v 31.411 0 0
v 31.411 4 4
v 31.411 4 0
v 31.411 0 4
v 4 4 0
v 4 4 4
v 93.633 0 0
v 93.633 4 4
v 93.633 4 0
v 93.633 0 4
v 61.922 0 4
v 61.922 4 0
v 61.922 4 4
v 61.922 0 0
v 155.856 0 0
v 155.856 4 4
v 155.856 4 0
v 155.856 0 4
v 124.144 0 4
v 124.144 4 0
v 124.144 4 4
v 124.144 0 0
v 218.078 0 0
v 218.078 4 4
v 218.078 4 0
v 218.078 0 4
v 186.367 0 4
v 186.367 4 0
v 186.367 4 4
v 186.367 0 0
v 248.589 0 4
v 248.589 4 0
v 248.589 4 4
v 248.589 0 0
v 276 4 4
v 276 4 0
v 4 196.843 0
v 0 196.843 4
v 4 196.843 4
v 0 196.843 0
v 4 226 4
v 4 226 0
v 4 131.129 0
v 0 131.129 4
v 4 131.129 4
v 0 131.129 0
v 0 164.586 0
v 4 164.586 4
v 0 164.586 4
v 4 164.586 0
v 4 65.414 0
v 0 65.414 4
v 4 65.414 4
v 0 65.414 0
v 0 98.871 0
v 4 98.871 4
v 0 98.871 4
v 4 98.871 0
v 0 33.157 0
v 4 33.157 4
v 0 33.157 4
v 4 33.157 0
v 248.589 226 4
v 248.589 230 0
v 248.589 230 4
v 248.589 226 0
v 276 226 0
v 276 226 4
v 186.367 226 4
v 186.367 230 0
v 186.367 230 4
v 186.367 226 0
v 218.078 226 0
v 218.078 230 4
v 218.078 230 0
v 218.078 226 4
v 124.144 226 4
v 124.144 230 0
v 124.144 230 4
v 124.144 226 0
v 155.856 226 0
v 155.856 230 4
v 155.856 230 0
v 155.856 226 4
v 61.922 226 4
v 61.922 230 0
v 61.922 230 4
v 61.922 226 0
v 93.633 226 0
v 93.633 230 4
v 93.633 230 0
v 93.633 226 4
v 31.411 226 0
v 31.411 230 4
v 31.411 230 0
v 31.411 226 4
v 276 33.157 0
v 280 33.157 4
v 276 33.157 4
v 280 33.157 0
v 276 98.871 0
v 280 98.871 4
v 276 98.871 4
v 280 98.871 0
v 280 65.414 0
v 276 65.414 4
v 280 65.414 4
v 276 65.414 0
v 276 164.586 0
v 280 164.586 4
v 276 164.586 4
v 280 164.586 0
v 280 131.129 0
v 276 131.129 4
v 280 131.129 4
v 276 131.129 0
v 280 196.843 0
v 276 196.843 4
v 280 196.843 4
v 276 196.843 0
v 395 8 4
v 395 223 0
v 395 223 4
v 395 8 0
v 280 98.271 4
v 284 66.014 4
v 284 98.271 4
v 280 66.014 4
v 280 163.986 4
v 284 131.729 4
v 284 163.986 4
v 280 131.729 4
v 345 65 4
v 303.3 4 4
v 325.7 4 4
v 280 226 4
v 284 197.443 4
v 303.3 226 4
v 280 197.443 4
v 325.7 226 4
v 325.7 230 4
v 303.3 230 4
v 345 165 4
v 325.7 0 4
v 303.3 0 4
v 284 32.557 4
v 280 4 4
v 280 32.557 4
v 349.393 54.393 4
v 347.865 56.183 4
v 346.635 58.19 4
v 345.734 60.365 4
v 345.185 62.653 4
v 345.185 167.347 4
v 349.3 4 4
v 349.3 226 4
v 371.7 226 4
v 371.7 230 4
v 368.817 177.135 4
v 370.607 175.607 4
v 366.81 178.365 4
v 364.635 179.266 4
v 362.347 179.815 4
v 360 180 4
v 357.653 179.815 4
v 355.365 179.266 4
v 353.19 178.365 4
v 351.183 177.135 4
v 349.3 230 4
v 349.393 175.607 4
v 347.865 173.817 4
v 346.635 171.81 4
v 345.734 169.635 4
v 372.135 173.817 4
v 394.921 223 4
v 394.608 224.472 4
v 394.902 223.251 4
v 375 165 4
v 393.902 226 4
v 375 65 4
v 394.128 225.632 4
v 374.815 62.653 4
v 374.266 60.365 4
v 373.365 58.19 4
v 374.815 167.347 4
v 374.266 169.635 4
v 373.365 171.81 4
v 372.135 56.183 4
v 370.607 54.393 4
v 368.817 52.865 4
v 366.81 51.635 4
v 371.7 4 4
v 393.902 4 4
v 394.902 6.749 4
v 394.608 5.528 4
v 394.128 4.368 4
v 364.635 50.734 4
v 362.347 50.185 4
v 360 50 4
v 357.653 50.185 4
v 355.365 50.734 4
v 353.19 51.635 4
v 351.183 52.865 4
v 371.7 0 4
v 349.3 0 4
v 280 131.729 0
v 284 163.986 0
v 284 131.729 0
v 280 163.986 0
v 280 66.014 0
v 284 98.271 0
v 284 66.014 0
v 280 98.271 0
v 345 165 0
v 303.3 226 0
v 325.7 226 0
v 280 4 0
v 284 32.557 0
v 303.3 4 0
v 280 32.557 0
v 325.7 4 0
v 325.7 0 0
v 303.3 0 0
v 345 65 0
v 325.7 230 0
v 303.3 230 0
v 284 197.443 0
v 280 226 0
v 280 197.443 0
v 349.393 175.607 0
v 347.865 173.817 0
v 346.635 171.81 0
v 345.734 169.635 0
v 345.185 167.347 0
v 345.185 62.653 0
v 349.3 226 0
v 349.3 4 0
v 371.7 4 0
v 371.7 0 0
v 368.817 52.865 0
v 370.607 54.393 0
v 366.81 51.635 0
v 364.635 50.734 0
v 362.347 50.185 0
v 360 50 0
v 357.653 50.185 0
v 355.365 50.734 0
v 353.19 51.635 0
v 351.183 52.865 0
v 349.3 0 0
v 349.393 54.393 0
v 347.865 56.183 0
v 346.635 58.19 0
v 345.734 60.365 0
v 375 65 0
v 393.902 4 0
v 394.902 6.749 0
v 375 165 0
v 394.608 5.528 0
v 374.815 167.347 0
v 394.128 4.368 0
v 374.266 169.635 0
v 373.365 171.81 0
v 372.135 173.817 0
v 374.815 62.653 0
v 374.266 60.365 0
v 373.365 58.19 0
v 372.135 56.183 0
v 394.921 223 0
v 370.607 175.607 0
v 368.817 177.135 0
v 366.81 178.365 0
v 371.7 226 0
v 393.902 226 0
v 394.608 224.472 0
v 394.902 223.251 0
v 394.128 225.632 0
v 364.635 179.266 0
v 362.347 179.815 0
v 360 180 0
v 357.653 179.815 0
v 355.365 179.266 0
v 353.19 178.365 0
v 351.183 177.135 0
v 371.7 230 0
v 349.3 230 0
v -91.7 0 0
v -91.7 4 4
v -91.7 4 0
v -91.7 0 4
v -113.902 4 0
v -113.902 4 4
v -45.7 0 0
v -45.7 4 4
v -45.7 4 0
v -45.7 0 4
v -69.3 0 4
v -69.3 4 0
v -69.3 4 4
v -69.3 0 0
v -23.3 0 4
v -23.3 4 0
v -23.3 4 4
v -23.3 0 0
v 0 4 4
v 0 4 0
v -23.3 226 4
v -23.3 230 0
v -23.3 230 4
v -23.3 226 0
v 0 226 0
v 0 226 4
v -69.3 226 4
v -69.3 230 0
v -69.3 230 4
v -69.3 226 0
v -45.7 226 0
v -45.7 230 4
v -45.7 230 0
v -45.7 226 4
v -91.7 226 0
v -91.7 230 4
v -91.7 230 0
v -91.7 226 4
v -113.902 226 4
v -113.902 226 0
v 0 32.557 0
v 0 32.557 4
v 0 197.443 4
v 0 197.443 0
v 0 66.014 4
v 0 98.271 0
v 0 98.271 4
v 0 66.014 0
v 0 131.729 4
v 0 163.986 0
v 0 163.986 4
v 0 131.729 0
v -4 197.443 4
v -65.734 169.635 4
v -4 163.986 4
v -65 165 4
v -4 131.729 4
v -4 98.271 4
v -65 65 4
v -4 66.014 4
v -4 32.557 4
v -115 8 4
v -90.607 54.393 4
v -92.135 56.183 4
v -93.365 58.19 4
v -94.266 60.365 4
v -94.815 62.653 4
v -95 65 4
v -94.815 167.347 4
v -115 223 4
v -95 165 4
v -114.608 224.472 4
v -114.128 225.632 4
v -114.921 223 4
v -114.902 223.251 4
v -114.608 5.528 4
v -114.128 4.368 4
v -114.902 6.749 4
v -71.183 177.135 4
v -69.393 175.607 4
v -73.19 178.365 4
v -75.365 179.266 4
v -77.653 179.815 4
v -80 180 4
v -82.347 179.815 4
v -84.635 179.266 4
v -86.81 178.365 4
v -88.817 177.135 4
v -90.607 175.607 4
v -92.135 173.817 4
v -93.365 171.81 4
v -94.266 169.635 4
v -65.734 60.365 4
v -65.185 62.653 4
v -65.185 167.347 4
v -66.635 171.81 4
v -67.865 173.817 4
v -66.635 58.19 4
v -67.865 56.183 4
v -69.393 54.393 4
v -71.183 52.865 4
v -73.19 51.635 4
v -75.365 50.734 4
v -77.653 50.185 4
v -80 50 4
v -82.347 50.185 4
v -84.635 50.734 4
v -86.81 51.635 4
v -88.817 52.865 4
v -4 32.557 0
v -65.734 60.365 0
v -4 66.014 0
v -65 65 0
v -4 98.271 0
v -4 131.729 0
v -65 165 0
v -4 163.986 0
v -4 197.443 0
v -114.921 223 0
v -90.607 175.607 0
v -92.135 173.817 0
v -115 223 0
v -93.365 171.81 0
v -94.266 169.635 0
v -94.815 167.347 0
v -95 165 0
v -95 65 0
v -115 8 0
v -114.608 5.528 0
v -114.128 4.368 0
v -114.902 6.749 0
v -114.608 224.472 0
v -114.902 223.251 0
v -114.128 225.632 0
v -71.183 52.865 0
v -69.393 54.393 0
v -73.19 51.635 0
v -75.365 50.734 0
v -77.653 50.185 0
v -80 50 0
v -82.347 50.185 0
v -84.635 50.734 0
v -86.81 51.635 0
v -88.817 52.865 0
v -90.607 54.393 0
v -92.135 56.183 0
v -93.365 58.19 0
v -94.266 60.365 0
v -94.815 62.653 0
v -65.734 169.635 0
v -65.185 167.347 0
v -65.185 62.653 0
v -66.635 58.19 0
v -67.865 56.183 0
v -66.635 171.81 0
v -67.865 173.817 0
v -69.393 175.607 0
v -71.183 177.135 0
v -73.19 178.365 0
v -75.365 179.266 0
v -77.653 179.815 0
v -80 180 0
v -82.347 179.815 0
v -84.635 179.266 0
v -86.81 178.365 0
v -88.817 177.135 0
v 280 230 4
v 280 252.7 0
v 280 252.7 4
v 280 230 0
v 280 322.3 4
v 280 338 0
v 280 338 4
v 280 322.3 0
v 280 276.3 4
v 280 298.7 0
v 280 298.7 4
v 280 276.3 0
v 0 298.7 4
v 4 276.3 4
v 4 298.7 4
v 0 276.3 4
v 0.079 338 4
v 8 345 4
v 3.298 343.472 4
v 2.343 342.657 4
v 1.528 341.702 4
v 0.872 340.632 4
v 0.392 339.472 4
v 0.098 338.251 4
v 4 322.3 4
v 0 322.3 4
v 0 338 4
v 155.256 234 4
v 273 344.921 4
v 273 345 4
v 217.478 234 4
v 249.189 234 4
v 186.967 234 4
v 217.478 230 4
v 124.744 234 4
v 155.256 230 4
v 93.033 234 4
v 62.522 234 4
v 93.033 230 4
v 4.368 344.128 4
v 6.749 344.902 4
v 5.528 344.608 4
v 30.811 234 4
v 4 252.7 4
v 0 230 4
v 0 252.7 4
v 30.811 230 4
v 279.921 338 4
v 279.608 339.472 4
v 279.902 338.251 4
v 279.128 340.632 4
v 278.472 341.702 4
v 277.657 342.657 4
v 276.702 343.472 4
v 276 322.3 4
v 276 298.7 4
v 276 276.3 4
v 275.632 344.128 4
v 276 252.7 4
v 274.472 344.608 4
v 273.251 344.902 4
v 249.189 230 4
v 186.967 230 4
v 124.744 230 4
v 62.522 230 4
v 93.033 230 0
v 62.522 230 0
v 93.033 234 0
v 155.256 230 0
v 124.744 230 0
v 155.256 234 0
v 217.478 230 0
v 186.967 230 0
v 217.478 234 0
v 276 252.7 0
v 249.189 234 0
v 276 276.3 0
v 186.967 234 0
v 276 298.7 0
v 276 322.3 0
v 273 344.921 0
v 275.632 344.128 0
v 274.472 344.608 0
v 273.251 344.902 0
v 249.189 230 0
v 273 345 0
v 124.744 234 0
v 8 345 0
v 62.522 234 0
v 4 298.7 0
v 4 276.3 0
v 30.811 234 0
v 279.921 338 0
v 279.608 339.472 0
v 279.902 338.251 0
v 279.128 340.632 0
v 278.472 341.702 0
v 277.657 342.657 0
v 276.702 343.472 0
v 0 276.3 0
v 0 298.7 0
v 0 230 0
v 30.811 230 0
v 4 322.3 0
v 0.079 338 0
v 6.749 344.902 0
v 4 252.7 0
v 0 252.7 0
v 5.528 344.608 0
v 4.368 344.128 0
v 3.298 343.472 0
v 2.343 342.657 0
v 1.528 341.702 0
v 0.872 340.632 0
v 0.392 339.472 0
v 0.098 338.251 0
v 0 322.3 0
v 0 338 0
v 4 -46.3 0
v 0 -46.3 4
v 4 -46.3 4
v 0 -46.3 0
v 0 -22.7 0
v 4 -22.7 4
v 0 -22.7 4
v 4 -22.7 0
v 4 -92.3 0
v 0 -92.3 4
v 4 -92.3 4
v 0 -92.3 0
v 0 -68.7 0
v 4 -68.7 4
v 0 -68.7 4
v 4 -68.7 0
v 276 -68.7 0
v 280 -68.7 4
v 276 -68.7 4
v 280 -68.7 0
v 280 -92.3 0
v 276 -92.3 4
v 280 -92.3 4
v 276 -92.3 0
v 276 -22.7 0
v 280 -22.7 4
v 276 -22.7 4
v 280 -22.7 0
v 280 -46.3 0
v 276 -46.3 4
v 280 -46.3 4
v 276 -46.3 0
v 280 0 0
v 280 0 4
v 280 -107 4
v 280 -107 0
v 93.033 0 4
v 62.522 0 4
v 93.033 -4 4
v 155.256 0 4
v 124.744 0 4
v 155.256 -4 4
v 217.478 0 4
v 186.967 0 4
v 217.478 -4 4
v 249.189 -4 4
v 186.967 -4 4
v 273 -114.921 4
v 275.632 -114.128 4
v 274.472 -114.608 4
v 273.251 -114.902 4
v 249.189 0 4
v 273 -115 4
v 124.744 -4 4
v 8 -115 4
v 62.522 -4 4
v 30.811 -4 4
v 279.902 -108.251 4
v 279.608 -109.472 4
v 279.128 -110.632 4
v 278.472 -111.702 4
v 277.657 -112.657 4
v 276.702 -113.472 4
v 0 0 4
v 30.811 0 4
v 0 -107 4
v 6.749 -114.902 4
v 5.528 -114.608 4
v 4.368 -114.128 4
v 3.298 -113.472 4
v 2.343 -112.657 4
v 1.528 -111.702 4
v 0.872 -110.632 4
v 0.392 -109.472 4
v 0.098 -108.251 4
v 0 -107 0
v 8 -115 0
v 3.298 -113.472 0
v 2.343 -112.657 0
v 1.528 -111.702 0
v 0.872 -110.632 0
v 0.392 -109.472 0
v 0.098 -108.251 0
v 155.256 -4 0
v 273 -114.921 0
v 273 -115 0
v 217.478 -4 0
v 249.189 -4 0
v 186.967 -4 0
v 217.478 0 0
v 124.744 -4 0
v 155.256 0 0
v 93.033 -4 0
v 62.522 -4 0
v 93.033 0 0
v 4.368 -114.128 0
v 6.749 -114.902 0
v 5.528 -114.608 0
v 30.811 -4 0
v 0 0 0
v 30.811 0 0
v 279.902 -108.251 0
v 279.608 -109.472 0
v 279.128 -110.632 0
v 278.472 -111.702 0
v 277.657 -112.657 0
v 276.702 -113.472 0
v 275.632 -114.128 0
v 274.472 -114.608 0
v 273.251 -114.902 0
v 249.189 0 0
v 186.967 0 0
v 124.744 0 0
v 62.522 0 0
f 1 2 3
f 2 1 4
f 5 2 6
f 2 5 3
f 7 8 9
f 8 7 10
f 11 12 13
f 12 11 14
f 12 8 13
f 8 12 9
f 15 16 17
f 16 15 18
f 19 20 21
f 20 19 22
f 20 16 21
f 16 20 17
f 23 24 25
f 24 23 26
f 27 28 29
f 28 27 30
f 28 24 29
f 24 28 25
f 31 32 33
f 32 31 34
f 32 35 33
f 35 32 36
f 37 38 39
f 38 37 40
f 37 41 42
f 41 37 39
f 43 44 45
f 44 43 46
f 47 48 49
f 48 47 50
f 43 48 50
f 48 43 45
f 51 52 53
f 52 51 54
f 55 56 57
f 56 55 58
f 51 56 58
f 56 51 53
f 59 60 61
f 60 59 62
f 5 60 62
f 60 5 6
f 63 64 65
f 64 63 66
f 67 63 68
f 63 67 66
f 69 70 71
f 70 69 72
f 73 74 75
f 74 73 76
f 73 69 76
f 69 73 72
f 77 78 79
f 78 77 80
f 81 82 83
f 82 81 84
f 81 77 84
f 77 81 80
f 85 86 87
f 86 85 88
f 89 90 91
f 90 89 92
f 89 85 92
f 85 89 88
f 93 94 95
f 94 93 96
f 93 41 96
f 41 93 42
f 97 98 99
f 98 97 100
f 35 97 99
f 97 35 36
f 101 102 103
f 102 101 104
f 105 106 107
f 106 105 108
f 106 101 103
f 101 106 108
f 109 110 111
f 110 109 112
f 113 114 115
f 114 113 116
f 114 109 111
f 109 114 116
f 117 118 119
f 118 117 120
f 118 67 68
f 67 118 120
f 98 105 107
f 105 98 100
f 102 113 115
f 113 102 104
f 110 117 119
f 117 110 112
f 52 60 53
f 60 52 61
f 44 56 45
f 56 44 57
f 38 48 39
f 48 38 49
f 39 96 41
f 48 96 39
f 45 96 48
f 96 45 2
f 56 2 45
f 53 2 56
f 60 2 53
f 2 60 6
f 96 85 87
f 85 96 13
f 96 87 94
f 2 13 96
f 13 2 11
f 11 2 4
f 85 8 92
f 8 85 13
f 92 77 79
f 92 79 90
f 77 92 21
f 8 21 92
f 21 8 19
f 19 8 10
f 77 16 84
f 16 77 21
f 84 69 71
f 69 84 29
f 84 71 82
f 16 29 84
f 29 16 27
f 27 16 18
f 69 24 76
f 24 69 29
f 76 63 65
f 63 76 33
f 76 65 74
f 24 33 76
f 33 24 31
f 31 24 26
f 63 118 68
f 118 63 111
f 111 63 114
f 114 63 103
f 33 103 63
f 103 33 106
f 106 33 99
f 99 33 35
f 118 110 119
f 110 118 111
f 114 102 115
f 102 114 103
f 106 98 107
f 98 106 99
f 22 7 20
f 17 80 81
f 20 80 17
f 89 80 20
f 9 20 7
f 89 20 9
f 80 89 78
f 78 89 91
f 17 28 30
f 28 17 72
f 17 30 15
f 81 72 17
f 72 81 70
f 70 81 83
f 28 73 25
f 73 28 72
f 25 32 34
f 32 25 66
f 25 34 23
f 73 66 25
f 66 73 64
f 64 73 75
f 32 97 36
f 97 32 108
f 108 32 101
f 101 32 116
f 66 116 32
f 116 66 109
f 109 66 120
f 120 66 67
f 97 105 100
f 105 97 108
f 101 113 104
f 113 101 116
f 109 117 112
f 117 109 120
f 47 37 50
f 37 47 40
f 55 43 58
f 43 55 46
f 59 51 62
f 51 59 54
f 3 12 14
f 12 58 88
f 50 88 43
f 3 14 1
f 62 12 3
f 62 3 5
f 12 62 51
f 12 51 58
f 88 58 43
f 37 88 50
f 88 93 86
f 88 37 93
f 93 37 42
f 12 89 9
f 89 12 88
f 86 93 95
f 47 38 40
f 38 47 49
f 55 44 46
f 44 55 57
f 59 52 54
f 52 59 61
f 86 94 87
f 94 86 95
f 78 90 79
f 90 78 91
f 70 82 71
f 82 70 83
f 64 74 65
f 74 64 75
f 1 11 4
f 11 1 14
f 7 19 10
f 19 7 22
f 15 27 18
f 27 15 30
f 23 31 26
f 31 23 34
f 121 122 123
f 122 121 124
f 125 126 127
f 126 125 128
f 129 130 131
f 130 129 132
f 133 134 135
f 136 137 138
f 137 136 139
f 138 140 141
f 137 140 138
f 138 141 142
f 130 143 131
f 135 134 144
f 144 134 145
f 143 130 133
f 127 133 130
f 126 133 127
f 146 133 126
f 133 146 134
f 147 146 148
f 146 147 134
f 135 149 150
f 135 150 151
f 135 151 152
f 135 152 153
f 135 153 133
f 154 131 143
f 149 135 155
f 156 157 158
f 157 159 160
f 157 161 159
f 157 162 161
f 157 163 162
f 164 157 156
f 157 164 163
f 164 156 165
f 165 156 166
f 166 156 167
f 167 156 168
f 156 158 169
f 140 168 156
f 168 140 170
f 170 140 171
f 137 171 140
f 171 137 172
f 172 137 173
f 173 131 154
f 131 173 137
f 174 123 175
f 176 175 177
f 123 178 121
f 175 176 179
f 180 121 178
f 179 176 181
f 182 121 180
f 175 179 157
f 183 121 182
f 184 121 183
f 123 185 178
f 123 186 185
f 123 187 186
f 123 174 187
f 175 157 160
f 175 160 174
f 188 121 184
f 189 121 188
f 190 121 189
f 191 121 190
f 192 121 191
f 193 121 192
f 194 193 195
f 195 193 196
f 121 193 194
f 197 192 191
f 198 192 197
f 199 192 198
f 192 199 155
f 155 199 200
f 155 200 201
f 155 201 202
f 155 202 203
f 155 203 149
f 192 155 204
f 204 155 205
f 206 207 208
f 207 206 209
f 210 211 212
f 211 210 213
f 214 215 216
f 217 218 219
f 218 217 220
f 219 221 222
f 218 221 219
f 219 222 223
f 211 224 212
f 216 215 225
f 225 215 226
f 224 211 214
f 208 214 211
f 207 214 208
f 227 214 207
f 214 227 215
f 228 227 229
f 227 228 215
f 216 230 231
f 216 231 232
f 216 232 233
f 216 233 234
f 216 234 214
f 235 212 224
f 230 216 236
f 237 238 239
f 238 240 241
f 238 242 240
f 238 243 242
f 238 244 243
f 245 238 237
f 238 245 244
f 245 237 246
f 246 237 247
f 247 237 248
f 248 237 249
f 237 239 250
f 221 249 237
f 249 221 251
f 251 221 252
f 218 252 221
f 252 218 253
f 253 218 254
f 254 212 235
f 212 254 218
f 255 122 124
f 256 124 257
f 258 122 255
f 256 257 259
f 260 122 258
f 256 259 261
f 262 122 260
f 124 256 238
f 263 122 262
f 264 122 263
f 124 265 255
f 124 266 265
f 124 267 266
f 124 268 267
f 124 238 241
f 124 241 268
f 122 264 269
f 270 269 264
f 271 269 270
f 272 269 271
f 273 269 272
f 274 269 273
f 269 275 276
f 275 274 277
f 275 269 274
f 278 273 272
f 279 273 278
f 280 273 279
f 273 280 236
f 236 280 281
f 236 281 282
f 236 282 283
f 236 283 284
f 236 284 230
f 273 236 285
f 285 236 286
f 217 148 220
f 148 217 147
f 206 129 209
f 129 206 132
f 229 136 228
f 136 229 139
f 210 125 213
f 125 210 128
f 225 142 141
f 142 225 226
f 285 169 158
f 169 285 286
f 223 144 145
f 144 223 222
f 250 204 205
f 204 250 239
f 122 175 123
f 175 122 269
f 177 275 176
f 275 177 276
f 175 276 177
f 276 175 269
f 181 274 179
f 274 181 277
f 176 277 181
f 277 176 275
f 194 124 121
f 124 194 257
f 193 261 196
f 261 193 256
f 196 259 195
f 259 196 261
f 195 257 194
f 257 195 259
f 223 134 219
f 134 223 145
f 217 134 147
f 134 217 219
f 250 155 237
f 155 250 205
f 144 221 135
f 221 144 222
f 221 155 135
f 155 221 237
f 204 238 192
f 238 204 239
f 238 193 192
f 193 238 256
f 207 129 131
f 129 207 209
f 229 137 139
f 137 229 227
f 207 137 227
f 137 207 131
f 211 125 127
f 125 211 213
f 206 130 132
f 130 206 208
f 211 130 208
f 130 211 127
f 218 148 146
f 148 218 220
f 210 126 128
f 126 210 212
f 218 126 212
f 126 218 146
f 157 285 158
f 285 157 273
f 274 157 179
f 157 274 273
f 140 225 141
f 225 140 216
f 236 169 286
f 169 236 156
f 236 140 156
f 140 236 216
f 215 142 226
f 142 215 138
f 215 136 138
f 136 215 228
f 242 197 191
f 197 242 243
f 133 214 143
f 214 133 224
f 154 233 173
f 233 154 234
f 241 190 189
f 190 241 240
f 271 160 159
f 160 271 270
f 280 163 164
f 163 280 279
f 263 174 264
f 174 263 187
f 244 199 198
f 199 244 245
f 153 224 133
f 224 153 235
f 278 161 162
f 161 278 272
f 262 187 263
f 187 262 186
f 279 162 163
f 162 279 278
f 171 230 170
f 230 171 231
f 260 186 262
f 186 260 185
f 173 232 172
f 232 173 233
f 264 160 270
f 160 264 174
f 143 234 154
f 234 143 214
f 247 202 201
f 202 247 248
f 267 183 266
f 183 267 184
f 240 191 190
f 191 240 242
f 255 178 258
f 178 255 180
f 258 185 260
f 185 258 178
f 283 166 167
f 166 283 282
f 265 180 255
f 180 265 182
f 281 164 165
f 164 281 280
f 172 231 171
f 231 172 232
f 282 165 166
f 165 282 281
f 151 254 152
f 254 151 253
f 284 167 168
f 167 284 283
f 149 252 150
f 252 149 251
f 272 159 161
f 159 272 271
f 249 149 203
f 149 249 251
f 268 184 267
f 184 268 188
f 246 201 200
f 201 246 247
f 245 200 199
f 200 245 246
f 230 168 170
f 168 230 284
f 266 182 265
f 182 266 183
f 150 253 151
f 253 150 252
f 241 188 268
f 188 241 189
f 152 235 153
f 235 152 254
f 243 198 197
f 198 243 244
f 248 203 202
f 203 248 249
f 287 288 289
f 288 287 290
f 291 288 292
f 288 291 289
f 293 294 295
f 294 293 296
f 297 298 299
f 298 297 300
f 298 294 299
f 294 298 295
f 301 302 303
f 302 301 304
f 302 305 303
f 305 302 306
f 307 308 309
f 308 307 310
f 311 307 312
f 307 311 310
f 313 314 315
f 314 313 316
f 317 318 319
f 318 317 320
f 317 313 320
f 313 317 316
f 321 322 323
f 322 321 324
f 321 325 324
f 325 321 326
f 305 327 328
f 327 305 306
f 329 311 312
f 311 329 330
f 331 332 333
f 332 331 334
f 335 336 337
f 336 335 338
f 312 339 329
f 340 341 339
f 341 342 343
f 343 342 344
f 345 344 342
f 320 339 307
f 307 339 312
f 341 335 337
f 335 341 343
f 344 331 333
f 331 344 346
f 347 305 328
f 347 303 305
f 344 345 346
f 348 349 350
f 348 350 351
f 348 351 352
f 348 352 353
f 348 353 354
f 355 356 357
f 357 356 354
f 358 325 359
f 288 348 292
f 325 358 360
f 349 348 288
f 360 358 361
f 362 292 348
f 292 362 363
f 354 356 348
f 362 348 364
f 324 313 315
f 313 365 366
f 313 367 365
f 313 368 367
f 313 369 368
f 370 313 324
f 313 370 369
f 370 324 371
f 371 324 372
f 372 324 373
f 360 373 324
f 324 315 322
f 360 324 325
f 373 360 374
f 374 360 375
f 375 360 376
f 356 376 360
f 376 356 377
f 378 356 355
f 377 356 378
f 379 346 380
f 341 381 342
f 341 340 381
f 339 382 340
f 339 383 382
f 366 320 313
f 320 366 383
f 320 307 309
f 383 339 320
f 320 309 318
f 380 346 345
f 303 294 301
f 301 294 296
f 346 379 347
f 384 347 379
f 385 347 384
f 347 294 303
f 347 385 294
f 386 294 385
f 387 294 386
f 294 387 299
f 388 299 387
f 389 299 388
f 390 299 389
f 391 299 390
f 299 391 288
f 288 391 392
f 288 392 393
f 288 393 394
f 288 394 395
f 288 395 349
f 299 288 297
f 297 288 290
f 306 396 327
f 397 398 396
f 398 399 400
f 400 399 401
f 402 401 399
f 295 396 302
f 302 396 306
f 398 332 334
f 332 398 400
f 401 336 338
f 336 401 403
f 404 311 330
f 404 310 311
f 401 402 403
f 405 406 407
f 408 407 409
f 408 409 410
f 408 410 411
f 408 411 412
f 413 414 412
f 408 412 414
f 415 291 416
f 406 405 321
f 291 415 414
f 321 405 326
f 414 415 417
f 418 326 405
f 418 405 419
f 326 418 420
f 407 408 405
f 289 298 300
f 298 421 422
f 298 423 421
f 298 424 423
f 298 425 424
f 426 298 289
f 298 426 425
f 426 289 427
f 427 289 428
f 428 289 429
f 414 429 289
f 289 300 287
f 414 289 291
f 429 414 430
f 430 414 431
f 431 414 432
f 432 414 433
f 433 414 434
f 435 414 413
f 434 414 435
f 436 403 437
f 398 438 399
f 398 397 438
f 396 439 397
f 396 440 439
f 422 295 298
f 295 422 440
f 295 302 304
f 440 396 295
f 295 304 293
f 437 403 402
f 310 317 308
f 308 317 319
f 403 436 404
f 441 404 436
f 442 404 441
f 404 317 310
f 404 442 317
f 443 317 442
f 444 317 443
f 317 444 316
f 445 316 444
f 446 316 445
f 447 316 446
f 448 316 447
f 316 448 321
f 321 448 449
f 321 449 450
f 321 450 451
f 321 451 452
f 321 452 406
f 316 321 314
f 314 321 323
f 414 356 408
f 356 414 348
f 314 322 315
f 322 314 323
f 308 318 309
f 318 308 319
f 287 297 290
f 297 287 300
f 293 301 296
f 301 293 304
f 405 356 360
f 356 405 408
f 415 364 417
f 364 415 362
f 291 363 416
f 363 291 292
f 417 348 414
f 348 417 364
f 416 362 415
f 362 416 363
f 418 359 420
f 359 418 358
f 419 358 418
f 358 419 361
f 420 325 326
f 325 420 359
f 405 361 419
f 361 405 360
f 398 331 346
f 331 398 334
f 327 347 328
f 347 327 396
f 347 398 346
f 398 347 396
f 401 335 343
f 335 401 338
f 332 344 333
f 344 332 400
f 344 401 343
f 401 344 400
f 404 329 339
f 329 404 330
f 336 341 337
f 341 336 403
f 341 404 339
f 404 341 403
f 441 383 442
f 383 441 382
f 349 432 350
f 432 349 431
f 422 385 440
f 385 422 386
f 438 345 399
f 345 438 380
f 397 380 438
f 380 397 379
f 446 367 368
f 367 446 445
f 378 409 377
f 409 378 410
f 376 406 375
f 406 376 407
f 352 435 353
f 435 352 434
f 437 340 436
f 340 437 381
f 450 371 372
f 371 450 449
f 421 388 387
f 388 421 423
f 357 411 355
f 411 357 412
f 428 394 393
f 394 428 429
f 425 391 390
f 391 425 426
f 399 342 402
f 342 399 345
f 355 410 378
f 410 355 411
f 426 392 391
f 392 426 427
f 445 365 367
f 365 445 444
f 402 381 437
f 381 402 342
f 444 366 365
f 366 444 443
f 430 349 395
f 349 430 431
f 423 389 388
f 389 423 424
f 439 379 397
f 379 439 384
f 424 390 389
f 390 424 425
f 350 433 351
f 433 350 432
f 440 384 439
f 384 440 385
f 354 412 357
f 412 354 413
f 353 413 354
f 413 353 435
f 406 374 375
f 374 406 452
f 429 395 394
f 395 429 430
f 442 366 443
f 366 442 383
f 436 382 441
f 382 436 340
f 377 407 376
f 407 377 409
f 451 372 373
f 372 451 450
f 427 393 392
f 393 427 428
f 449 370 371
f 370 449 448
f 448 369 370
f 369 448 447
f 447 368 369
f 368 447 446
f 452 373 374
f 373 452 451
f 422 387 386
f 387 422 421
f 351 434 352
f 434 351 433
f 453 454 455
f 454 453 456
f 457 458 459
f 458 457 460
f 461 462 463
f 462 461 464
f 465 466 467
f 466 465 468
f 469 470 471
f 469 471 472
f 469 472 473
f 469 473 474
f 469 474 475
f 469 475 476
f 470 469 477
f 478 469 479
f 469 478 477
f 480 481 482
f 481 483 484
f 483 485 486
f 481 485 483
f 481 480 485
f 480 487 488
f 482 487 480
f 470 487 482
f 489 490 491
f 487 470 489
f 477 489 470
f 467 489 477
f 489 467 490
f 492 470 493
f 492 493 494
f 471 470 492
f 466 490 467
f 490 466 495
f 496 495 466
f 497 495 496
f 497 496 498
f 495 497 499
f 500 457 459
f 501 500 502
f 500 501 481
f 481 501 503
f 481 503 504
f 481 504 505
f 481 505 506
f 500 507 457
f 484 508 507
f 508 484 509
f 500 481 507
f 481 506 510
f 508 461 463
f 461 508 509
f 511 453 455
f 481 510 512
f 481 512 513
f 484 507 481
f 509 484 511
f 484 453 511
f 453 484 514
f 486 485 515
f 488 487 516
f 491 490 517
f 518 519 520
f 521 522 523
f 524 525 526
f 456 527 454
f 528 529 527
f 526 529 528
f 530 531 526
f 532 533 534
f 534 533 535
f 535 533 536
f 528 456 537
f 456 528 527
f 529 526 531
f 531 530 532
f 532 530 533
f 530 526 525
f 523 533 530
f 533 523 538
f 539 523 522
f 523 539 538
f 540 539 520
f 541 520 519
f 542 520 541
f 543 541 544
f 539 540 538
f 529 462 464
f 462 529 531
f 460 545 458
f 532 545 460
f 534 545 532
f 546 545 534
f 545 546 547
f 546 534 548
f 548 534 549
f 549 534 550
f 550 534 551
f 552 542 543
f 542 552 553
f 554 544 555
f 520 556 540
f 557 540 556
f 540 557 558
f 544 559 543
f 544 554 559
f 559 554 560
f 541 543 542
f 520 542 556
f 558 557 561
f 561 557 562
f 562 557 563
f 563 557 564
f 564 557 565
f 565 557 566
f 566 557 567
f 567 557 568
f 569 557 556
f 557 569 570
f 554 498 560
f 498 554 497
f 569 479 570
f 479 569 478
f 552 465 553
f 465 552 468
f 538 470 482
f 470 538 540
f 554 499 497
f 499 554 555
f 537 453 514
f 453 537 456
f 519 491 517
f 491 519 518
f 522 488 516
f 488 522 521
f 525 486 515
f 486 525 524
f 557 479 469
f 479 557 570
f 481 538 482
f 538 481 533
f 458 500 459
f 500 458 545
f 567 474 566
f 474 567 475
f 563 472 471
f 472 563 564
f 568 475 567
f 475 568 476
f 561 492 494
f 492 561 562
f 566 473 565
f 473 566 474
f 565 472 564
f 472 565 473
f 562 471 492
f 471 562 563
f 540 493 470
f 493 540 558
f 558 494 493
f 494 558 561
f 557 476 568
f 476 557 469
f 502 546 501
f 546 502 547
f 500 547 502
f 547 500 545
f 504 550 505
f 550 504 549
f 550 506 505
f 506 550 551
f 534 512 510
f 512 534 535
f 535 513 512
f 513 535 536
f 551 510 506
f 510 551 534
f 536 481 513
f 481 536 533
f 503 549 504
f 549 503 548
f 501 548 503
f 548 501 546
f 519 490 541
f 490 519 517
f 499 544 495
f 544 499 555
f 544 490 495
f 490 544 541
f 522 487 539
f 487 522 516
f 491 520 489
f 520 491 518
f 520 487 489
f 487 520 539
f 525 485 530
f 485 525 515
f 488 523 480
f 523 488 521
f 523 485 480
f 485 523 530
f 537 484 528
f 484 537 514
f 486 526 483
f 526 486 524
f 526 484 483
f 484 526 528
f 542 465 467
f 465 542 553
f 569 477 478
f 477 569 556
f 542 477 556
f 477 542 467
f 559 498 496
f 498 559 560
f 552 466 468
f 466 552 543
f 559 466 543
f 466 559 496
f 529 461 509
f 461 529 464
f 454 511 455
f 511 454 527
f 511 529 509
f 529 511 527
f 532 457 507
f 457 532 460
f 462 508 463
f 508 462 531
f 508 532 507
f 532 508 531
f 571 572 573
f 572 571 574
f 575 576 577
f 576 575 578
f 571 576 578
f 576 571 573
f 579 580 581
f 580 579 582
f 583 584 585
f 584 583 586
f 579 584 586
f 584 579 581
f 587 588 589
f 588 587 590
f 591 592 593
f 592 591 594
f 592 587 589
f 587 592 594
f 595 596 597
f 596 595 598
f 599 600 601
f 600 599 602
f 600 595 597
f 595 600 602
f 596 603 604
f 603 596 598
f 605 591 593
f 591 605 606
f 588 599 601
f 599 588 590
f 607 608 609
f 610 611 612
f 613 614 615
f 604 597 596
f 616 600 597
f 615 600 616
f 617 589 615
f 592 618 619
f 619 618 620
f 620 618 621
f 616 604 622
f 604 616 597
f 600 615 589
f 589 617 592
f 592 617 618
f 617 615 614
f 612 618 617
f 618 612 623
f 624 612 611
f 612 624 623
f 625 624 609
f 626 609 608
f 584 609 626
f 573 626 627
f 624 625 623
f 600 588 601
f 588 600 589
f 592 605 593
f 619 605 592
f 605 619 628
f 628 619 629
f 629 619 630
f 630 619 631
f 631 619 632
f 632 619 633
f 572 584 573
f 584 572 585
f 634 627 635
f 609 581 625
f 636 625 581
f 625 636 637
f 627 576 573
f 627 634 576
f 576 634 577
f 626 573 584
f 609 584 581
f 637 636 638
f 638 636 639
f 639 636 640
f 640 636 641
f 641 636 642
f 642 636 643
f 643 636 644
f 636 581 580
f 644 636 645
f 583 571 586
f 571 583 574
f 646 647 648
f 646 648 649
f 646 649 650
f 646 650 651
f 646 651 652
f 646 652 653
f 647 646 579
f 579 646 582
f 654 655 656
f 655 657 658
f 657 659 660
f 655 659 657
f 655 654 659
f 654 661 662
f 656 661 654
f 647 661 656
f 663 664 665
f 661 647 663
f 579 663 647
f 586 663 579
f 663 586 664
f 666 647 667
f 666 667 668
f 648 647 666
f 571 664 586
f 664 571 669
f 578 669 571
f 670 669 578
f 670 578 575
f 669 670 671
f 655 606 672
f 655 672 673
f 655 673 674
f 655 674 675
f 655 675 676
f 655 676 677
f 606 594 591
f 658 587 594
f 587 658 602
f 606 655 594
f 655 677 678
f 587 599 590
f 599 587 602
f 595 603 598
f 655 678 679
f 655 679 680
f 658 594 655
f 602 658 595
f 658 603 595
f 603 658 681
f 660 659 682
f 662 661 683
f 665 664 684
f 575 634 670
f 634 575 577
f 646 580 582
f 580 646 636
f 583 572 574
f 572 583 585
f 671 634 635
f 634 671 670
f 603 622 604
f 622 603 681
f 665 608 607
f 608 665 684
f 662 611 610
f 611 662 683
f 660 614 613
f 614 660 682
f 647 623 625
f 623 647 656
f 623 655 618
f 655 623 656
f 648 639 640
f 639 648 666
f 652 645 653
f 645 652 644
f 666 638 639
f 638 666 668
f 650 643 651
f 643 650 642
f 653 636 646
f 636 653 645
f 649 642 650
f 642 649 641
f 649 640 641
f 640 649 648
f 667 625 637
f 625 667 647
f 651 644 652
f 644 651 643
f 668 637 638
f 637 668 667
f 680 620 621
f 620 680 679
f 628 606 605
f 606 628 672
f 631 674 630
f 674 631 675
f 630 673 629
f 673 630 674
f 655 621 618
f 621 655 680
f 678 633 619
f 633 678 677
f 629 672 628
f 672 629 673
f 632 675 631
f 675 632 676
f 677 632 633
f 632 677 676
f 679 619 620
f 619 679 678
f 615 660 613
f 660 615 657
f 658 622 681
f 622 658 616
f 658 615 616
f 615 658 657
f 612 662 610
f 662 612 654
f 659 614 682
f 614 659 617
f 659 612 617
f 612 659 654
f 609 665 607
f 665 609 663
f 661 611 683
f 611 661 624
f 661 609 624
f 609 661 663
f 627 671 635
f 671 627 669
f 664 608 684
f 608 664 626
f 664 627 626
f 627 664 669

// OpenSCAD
// options: assembled, unfolded, optimized, projection
mode = "unfolded"; 	// parts are layed flat
//mode = "assembled"; 	// box representation
//mode = "optimized"; 	// parts are layed flat and positioned to minimize waste material
//mode = "projection"; 	// projection of optimized mode, for exporting dxf

$fn = 40;

// thickness of the material
thickness = 4;

// outter dimensions of the box
width = 280;
length = 230;
height = 115;

// number of teeth along width
teethW = 9;
// number of teeth along length
teethL = 7;
// number of teeth along height
teethH = 5;

// add or remove slit for handling
slitPresent = true;
// slit rounding radius
slitR = 15;
// slit length
slitL = 100;
// handle thickness
slitThickness = 20;

// top corners chamfer radius, 0 to disable
chamferR = 8;

// positive value narrows the teeth, negative - widens them
tolerance = 0.3;

if(mode=="projection")
	projection()
	box();
else
	box();

module box()
{
	angle = mode=="assembled"?90:0;

	if(mode!="optimized" && mode!="projection")
	{
		bottom();
		right(angle);
		left(angle);
		rear(angle);
		front(angle);
	}
	else
	{
		translate([height, 0, 0])
		{
			bottom();
			right(angle);
			left(angle);
		}

		translate([width/2 + width + 1, -height/2 - 1, 0])
		rotate([0, 0, 180])
		translate([-width/2, -height/2 - length, 0])
		rear(angle);
		
		translate([0, -1, 0])
		front(angle);
	}
}

module bottom()
{
	wall(width, length, thickness, [teethW, teethL, teethW, teethL], [0, 0, 0, 0]);
}

module right(angle)
{
	translate([width, 0, 0])
	rotate([0, -1*angle, 0])
	difference()
	{
		wall(height, length, thickness, [teethH, teethL, teethH, 0], [0, 1, 0, 0], [0, 0, chamferR, chamferR]);
		if(slitPresent)
			hull()
			{
				for(i = [-1:2:1])
				translate([height - slitThickness - slitR, length/2 + slitL/2*i, -1])
				cylinder(r = slitR, h = thickness + 2);
			}
	}
}

module left(angle)
{
	rotate([0, angle, 0])
	translate([-height, 0, 0])
	difference()
	{
		wall(height, length, thickness, [teethH, 0, teethH, teethL], [0, 1, 0, 1], [chamferR, chamferR, 0, 0]);
		if(slitPresent)
			hull()
			{
				for(i = [-1:2:1])
				translate([slitThickness + slitR, length/2 + slitL/2*i, -1])
				cylinder(r = slitR, h = thickness + 2);
			}
	}
}

module front(angle)
{
	rotate([-1*angle, 0, 0])
	translate([0, -height, 0])
	wall(width, height, thickness, [0, teethH, teethW, teethH], [0, 1, 1, 1], [chamferR, 0, 0, chamferR]);
}

module rear(angle)
{
	translate([0, length, 0])
	rotate([angle, 0, 0])
	wall(width, height, thickness, [teethW, teethH, 0, teethH], [1, 1, 0, 1], [0, chamferR, chamferR, 0]);
}

// teethConf - 4 values showing number of teeth, 0 - teeth are not cut
// teethOddity - 4 values, 0 for even teeth, 1 - for odd
module wall(x, y, thickness, teethConf, teethOddity, chamferConfig)
{
	difference()
	{
		union()
		{
			difference()
			{
				cube([x, y, thickness]);

				if(chamferConfig[0] > 0)
					translate([-1, -1, -1])
					cube([chamferConfig[0]+1, chamferConfig[0]+1, thickness+2]);
				if(chamferConfig[1] > 0)
					translate([-1, y - chamferConfig[1] + 1, -1])
					cube([chamferConfig[1]+1, chamferConfig[1]+1, thickness+2]);
				if(chamferConfig[2] > 0)
					translate([x - chamferConfig[2] +1, y - chamferConfig[2] + 1, -1])
					cube([chamferConfig[2]+1, chamferConfig[2]+1, thickness+2]);
				if(chamferConfig[3] > 0)
					translate([x - chamferConfig[3] +1, -1, -1])
					cube([chamferConfig[3]+1, chamferConfig[3]+1, thickness+2]);
			}

			if(chamferConfig[0] > 0)
				translate([chamferConfig[0], chamferConfig[0], 0])
				cylinder(r = chamferConfig[0], h = thickness);
			if(chamferConfig[1] > 0)
				translate([chamferConfig[1], y - chamferConfig[1], 0])
				cylinder(r = chamferConfig[1], h = thickness);
			if(chamferConfig[2] > 0)
				translate([x - chamferConfig[2], y - chamferConfig[2], 0])
				cylinder(r = chamferConfig[2], h = thickness);
			if(chamferConfig[3] > 0)
				translate([x - chamferConfig[3], chamferConfig[3], 0])
				cylinder(r = chamferConfig[3], h = thickness);
		}

		if(teethConf[0] > 0)
			cutter(x, teethConf[0], thickness, teethOddity[0]==0);

		if(teethConf[1] > 0)
			translate([0, y, 0])
			rotate([0, 0, -90])
			cutter(y, teethConf[1], thickness, teethOddity[1]==0);

		if(teethConf[2] > 0)
			translate([x, y, 0])
			rotate([0, 0, -180])
			cutter(x, teethConf[2], thickness, teethOddity[2]==0);

		if(teethConf[3] > 0)
			translate([x, 0, 0])
			rotate([0, 0, -270])
			cutter(y, teethConf[3], thickness, teethOddity[3]==0);
	}
}

// tool for cutting teeth
module cutter(length, count, thickness, odd = true)
{
	for(i = [0:count-1])
	{
		if(odd && i%2 == 0)
			translate([i*length/count - tolerance, -1, -1])
			cube([length/count + tolerance*2, thickness+1, thickness+2]);
		if(!odd && i%2 != 0)
			translate([i*length/count - tolerance, -1, -1])
			cube([length/count + tolerance*2, thickness+1, thickness+2]);
	}
}
